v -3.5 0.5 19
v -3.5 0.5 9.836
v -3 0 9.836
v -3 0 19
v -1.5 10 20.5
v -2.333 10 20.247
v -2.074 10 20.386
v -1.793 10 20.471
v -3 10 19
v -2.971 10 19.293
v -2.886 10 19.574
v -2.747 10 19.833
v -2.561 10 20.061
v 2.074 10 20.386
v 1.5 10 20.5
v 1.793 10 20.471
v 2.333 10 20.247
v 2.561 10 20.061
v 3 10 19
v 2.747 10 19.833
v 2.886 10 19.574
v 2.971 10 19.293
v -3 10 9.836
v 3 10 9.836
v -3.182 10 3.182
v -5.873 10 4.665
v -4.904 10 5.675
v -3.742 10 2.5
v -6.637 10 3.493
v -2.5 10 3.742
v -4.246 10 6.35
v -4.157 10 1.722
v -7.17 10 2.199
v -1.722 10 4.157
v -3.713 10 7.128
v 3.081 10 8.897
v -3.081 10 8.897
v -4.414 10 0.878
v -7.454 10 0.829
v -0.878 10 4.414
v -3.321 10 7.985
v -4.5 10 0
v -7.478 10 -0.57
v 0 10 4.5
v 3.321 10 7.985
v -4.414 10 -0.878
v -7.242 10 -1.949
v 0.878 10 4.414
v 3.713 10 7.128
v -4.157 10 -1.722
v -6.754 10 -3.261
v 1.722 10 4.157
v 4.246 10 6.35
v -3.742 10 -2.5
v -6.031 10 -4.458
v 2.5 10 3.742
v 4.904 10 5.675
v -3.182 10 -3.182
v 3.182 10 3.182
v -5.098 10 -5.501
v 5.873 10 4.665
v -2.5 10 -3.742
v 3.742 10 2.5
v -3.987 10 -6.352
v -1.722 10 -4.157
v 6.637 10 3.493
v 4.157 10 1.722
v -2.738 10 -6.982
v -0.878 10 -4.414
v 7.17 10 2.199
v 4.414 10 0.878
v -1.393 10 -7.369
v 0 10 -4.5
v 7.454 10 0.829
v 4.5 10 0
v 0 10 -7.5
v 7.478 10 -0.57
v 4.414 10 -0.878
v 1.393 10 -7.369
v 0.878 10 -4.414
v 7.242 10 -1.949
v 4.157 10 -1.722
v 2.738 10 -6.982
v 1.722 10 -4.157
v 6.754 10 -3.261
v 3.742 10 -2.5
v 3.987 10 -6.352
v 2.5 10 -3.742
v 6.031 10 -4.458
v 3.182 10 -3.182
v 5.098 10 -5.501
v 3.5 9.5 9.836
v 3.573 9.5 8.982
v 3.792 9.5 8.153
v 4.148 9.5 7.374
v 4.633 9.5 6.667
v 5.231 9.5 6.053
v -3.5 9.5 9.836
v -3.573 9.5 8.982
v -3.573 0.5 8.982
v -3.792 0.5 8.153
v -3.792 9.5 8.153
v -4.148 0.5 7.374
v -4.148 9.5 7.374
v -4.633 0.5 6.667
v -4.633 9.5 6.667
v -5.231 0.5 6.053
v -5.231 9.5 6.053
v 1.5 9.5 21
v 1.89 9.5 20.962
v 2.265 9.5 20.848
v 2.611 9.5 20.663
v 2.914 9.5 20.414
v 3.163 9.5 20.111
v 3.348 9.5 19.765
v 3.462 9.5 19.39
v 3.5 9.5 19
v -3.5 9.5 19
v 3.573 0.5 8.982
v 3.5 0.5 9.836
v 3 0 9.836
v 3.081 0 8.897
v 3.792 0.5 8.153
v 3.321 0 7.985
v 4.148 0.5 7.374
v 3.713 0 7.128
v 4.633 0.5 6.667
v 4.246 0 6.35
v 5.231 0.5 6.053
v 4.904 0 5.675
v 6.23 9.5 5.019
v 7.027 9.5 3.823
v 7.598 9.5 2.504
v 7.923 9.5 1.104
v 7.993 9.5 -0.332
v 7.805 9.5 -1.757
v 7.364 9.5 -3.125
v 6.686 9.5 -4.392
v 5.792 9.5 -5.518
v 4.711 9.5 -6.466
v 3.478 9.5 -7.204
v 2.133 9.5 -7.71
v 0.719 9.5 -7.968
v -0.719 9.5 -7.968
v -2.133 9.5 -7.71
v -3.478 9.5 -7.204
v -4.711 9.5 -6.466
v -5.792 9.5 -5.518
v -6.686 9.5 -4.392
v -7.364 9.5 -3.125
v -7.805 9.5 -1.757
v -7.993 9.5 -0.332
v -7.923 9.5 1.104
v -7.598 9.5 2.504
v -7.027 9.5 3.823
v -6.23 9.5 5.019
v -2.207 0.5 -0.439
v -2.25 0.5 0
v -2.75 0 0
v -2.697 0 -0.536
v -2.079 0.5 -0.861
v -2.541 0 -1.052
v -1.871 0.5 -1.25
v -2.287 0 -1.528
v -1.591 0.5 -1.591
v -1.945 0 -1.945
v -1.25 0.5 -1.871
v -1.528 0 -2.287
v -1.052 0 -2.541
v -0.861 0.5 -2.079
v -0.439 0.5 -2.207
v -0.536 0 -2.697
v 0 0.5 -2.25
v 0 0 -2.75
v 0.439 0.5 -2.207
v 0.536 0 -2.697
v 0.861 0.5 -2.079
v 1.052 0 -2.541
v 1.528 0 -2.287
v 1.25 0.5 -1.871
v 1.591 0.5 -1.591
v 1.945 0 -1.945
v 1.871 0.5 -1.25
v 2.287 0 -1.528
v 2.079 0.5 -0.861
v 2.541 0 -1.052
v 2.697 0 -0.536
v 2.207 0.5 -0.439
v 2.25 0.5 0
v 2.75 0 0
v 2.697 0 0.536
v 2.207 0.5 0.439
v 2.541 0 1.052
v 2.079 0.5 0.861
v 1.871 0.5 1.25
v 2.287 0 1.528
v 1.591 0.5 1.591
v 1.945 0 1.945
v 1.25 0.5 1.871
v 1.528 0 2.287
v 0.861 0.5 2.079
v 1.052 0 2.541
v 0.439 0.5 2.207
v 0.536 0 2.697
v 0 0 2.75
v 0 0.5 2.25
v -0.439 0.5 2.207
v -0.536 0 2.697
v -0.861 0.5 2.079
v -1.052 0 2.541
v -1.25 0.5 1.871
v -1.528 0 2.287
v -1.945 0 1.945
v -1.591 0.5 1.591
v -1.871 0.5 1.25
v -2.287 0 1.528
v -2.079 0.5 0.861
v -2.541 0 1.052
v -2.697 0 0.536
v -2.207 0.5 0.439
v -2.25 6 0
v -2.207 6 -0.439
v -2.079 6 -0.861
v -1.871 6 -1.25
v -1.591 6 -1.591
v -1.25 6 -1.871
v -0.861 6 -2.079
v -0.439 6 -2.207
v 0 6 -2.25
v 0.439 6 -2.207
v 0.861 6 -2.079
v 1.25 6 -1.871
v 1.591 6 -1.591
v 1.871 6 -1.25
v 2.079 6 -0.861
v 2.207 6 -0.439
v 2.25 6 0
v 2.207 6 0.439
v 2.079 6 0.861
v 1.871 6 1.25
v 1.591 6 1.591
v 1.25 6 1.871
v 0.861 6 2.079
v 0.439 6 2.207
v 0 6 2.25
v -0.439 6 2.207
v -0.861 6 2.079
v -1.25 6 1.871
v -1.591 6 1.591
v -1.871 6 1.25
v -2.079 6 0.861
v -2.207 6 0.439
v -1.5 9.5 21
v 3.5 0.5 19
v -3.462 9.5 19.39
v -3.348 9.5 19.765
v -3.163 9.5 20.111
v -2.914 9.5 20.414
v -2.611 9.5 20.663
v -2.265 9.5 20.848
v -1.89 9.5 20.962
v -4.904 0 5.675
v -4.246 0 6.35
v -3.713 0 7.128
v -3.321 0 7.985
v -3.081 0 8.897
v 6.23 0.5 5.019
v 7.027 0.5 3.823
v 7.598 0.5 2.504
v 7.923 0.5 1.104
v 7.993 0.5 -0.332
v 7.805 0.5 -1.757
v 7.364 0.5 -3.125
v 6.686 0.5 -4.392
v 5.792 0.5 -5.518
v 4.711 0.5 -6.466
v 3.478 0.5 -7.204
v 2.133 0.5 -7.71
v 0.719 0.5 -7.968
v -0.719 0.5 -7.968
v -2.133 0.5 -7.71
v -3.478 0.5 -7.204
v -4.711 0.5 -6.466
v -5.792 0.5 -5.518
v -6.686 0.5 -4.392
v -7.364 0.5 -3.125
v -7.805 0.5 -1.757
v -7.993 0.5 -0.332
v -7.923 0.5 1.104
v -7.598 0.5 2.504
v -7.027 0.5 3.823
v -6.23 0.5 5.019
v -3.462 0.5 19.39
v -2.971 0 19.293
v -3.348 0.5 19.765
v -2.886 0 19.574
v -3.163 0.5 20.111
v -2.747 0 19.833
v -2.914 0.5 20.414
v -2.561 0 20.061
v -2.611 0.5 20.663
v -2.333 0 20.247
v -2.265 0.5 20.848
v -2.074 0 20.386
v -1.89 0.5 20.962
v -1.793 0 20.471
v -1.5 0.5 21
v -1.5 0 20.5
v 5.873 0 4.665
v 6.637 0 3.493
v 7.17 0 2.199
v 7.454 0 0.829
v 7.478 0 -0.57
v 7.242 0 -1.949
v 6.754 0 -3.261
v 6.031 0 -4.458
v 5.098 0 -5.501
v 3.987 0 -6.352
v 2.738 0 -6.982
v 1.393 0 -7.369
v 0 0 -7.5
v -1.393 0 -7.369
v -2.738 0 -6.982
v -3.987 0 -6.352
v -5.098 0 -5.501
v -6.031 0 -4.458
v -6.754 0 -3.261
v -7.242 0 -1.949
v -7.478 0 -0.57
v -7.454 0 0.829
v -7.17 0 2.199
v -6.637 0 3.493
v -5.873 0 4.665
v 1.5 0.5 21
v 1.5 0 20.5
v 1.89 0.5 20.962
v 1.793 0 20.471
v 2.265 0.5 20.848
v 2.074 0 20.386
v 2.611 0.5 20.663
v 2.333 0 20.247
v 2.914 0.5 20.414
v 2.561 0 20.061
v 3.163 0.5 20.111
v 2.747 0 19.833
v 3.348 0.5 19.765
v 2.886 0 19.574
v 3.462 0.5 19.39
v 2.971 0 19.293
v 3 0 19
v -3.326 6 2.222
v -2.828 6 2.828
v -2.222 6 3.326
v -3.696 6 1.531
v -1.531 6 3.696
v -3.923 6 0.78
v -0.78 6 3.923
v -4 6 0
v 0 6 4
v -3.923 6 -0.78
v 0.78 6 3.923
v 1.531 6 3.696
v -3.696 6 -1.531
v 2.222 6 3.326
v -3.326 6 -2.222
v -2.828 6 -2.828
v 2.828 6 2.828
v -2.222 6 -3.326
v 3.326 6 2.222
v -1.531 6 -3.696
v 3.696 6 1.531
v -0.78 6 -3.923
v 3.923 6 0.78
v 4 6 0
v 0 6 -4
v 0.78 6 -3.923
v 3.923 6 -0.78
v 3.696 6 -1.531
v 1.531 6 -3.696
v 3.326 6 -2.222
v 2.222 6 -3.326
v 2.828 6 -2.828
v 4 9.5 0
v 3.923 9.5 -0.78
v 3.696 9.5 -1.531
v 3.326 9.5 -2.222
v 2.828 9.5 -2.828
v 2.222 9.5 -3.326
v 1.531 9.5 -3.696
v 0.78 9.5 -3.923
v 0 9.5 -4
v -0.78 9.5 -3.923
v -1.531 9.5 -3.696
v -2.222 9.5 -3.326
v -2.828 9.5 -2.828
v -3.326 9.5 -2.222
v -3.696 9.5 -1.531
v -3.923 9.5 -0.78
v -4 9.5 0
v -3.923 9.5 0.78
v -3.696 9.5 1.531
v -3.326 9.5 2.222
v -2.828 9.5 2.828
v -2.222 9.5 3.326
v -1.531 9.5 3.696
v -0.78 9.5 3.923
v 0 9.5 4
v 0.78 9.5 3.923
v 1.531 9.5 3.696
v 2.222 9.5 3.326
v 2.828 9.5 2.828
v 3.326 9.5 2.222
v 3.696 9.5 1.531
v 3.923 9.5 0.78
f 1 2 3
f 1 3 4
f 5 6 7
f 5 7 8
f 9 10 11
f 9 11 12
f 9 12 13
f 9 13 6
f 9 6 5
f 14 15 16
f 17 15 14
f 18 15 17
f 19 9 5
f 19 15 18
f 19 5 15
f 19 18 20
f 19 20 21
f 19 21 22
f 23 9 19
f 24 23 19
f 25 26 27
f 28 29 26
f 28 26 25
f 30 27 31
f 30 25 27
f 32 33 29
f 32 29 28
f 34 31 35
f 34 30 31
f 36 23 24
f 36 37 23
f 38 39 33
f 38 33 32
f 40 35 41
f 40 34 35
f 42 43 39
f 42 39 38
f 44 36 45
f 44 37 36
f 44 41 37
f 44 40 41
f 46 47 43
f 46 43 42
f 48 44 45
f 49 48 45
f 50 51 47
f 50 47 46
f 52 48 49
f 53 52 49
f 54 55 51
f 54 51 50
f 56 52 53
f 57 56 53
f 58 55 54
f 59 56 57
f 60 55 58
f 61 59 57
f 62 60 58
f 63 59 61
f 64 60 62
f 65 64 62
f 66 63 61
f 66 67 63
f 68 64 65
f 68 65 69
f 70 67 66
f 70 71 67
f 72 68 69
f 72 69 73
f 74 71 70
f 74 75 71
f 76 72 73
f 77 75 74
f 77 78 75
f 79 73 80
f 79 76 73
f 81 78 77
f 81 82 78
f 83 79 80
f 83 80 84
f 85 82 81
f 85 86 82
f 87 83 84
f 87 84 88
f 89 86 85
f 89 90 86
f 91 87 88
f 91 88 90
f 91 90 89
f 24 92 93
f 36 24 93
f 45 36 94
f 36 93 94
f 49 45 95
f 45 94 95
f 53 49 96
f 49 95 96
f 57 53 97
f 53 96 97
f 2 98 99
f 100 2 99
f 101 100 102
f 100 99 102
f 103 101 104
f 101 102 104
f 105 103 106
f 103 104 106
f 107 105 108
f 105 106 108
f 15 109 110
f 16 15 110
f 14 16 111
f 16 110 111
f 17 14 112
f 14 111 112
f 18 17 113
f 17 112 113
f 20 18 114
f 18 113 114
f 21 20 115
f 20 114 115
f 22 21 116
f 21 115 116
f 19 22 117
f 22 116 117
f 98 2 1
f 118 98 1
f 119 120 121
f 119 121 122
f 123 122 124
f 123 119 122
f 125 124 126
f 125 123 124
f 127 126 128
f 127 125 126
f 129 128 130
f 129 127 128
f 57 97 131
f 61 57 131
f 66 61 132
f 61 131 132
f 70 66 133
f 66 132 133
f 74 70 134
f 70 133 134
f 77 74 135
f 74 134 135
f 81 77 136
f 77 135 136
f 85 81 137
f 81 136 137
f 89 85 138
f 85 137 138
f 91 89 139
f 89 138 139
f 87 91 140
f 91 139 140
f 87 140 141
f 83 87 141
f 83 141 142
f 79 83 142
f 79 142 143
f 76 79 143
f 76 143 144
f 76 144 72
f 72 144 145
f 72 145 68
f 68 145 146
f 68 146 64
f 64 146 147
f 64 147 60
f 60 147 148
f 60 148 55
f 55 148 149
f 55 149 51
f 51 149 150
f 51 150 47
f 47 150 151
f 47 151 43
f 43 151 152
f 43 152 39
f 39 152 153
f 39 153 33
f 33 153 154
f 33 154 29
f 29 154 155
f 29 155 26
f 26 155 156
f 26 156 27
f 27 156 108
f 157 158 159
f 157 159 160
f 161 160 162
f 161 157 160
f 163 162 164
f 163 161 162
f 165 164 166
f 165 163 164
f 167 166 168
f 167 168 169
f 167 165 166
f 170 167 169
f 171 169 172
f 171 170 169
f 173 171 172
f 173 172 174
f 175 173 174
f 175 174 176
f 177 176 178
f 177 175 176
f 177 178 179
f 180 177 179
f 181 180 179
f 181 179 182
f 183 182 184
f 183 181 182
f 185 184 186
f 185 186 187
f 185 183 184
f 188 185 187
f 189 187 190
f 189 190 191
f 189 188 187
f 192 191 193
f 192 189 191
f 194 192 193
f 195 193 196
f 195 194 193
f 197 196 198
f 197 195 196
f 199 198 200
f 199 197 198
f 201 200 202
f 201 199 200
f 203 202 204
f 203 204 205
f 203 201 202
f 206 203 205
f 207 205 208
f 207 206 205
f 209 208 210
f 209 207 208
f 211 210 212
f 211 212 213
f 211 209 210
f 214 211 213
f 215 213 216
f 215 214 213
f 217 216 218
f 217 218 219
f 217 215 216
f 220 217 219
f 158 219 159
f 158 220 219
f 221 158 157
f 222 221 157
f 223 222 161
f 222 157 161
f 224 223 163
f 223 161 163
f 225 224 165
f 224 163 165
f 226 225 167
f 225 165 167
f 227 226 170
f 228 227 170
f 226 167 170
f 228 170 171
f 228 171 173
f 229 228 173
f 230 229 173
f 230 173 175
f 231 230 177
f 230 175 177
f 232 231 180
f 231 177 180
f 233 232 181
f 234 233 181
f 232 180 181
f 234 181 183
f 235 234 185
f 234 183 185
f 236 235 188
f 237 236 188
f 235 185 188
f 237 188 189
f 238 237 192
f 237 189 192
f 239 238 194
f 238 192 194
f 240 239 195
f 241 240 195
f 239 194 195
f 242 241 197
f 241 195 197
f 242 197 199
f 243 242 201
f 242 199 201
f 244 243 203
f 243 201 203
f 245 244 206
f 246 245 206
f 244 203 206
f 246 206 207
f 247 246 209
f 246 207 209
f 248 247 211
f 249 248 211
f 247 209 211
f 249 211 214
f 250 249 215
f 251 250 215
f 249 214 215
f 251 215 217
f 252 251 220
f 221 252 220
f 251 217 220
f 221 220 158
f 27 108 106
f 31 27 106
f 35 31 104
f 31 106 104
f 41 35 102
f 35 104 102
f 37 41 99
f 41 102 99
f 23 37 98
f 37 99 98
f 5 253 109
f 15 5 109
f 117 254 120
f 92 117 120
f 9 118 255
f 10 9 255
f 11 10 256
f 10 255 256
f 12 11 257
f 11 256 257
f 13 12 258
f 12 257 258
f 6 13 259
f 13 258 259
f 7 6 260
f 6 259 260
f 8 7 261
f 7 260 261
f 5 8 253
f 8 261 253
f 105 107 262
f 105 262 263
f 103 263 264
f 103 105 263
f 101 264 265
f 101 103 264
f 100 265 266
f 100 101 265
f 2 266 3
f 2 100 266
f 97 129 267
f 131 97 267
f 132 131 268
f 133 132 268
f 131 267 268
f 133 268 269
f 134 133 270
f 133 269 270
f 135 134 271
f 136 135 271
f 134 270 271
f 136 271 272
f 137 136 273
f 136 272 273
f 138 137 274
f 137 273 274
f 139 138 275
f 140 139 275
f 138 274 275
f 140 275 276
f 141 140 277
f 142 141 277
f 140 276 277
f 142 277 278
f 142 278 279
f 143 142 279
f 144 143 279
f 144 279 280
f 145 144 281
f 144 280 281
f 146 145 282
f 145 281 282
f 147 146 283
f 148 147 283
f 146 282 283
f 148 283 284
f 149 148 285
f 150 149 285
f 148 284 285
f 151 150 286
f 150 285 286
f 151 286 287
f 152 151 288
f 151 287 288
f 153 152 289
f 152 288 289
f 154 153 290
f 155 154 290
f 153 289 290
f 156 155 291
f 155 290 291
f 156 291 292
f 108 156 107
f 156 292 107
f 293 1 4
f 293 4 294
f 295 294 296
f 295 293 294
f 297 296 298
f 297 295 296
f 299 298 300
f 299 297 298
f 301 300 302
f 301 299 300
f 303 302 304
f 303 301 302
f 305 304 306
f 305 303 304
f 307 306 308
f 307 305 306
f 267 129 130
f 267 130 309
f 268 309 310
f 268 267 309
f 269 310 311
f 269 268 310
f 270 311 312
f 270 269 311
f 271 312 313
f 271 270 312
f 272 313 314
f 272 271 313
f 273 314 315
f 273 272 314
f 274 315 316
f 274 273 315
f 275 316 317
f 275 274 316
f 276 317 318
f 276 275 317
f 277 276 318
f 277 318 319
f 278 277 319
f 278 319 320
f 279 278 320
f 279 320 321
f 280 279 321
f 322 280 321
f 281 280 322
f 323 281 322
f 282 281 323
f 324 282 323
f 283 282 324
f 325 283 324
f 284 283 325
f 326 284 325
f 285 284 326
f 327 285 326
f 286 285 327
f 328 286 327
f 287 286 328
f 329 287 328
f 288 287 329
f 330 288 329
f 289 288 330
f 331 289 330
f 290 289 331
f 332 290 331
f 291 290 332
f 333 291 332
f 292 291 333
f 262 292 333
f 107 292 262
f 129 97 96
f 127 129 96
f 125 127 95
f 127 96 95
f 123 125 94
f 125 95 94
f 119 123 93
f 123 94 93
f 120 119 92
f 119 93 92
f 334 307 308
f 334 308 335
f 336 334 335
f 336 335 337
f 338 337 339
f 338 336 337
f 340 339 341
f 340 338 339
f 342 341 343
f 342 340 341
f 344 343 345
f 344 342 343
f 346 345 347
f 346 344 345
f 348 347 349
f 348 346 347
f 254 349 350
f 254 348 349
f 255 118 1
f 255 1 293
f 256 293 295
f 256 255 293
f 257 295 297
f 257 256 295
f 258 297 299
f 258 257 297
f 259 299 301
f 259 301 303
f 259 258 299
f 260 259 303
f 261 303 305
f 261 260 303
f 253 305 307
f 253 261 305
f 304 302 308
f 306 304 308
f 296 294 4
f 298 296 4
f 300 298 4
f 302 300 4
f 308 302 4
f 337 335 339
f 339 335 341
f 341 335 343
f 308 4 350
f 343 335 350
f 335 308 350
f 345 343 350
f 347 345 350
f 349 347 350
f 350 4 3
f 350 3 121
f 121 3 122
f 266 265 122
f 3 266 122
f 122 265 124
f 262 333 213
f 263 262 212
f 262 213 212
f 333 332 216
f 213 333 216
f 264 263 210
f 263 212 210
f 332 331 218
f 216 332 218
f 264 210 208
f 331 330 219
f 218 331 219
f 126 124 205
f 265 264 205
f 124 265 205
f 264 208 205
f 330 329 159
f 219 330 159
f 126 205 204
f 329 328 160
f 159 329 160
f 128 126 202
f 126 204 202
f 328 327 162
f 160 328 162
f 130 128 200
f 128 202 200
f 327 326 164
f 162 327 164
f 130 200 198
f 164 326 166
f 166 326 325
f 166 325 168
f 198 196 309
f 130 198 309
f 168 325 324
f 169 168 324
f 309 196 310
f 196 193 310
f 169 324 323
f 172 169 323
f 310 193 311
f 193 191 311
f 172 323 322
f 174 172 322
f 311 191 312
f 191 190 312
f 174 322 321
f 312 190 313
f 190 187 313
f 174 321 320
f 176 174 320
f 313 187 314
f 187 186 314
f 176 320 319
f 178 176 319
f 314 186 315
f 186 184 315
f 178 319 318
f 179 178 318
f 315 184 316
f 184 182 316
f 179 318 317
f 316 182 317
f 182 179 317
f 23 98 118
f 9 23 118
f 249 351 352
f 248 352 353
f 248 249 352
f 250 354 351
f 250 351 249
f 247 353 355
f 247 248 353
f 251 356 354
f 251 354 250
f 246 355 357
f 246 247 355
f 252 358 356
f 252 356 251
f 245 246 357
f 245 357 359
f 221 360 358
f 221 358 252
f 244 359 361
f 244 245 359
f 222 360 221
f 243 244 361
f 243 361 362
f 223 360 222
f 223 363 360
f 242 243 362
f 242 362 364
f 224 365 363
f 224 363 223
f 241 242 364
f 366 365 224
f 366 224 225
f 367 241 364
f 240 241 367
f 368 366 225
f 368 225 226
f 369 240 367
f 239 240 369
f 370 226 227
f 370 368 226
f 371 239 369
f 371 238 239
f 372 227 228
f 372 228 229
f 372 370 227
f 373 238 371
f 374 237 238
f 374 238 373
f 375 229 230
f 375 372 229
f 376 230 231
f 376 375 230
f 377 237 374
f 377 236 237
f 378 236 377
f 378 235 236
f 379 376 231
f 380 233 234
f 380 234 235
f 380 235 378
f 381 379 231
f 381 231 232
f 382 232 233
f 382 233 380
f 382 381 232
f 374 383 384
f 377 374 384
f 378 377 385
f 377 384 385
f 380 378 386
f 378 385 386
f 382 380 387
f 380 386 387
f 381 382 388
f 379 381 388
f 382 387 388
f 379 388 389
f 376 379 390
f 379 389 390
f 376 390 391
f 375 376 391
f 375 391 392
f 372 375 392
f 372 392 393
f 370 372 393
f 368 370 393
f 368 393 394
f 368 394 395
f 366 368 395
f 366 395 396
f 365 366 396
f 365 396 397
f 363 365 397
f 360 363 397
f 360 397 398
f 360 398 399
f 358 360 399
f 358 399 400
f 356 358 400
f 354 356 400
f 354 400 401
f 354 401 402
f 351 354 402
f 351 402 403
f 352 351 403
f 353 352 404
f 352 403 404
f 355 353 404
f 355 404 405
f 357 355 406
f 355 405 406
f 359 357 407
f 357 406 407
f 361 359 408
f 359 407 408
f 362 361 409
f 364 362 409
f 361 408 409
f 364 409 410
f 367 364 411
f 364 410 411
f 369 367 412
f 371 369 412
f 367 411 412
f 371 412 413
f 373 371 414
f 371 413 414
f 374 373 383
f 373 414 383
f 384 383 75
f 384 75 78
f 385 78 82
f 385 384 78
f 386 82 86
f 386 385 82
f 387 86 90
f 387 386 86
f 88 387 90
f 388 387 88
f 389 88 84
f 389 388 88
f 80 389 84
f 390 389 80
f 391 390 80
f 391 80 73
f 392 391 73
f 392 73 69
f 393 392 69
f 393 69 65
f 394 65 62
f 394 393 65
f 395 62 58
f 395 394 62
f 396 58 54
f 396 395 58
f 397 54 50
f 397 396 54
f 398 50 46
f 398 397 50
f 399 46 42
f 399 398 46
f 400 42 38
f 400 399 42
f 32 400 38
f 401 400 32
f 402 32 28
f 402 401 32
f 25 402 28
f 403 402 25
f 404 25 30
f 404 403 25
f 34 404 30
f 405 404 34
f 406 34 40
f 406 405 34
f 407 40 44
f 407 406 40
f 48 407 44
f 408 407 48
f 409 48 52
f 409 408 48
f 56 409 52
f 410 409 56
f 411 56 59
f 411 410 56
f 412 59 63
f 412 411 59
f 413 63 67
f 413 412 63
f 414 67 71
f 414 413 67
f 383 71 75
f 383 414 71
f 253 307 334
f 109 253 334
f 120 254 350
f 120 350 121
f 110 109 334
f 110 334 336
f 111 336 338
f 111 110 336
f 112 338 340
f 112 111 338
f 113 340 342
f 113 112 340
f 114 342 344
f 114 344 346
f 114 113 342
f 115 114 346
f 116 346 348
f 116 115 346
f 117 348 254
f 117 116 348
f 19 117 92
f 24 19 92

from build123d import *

# Parameters (mm, degrees)
EXTRUDE_1_DEPTH             = 10
HOLE_WIZARD_M41_D           = 4.5
HOLE_WIZARD_M41_CBORE_D     = 8
HOLE_WIZARD_M41_CBORE_DEPTH = 4
FILLET_1_R                  = 2
FILLET_2_R                  = 5
CHAMFER_1_SIZE              = 0.5


with BuildPart() as part:
    # Эскиз1 → Бобышка-Вытянуть1 (new body)
    with BuildSketch(Plane(origin=(0, 0, 0), x_dir=(1, 0, 0), z_dir=(0, 1, 0))):
        with BuildLine():
            Line((-3.5, -7.193747285), (-3.5, -21))
            Line((-3.5, -21), (3.5, -21))
            Line((3.5, -21), (3.5, -7.193747285))
            ThreePointArc((3.5, -7.193747285), (0, 8), (-3.5, -7.193747285))
        make_face()
    extrude(amount=EXTRUDE_1_DEPTH)

    # Цековка для винта с внутренним шестигранником M41 (through all)
    with Locations(Plane(origin=(0, 10, 0), x_dir=(1, 0, 0), z_dir=(0, 1, 0))):
        with Locations((0, 0)):
            CounterBoreHole(HOLE_WIZARD_M41_D / 2, HOLE_WIZARD_M41_CBORE_D / 2, HOLE_WIZARD_M41_CBORE_DEPTH)

    # Скругление1
    fillet_1_edges = [part.edges().sort_by_distance(p)[0] for p in [
        (3.5, 5, 21),
        (-3.5, 5, 21),
    ]]
    fillet(fillet_1_edges, radius=FILLET_1_R)

    # Скругление2
    fillet_2_edges = [part.edges().sort_by_distance(p)[0] for p in [
        (-3.5, 5, 7.193747285),
        (3.5, 5, 7.193747285),
    ]]
    fillet(fillet_2_edges, radius=FILLET_2_R)

    # Фаска1
    chamfer_1_edges = [part.edges().sort_by_distance(p)[0] for p in [
        (-4, 10, 0),
        (2.25, 0, 0),
        (3.5, 0, 14.418078893),
        (3.5, 10, 14.418078893),
        (0, 0, 21),
        (-2.914213562, 0, 20.414213562),
        (2.914213562, 0, 20.414213562),
        (0, 10, 21),
        (-2.914213562, 10, 20.414213562),
        (2.914213562, 10, 20.414213562),
        (0, 0, -8),
        (0, 10, -8),
        (-3.5, 0, 14.418078893),
        (-3.5, 10, 14.418078893),
        (3.953234455, 0, 7.756032051),
        (3.953234455, 10, 7.756032051),
        (-3.953234455, 0, 7.756032051),
        (-3.953234455, 10, 7.756032051),
    ]]
    chamfer(chamfer_1_edges, length=CHAMFER_1_SIZE)


solid = part.part
